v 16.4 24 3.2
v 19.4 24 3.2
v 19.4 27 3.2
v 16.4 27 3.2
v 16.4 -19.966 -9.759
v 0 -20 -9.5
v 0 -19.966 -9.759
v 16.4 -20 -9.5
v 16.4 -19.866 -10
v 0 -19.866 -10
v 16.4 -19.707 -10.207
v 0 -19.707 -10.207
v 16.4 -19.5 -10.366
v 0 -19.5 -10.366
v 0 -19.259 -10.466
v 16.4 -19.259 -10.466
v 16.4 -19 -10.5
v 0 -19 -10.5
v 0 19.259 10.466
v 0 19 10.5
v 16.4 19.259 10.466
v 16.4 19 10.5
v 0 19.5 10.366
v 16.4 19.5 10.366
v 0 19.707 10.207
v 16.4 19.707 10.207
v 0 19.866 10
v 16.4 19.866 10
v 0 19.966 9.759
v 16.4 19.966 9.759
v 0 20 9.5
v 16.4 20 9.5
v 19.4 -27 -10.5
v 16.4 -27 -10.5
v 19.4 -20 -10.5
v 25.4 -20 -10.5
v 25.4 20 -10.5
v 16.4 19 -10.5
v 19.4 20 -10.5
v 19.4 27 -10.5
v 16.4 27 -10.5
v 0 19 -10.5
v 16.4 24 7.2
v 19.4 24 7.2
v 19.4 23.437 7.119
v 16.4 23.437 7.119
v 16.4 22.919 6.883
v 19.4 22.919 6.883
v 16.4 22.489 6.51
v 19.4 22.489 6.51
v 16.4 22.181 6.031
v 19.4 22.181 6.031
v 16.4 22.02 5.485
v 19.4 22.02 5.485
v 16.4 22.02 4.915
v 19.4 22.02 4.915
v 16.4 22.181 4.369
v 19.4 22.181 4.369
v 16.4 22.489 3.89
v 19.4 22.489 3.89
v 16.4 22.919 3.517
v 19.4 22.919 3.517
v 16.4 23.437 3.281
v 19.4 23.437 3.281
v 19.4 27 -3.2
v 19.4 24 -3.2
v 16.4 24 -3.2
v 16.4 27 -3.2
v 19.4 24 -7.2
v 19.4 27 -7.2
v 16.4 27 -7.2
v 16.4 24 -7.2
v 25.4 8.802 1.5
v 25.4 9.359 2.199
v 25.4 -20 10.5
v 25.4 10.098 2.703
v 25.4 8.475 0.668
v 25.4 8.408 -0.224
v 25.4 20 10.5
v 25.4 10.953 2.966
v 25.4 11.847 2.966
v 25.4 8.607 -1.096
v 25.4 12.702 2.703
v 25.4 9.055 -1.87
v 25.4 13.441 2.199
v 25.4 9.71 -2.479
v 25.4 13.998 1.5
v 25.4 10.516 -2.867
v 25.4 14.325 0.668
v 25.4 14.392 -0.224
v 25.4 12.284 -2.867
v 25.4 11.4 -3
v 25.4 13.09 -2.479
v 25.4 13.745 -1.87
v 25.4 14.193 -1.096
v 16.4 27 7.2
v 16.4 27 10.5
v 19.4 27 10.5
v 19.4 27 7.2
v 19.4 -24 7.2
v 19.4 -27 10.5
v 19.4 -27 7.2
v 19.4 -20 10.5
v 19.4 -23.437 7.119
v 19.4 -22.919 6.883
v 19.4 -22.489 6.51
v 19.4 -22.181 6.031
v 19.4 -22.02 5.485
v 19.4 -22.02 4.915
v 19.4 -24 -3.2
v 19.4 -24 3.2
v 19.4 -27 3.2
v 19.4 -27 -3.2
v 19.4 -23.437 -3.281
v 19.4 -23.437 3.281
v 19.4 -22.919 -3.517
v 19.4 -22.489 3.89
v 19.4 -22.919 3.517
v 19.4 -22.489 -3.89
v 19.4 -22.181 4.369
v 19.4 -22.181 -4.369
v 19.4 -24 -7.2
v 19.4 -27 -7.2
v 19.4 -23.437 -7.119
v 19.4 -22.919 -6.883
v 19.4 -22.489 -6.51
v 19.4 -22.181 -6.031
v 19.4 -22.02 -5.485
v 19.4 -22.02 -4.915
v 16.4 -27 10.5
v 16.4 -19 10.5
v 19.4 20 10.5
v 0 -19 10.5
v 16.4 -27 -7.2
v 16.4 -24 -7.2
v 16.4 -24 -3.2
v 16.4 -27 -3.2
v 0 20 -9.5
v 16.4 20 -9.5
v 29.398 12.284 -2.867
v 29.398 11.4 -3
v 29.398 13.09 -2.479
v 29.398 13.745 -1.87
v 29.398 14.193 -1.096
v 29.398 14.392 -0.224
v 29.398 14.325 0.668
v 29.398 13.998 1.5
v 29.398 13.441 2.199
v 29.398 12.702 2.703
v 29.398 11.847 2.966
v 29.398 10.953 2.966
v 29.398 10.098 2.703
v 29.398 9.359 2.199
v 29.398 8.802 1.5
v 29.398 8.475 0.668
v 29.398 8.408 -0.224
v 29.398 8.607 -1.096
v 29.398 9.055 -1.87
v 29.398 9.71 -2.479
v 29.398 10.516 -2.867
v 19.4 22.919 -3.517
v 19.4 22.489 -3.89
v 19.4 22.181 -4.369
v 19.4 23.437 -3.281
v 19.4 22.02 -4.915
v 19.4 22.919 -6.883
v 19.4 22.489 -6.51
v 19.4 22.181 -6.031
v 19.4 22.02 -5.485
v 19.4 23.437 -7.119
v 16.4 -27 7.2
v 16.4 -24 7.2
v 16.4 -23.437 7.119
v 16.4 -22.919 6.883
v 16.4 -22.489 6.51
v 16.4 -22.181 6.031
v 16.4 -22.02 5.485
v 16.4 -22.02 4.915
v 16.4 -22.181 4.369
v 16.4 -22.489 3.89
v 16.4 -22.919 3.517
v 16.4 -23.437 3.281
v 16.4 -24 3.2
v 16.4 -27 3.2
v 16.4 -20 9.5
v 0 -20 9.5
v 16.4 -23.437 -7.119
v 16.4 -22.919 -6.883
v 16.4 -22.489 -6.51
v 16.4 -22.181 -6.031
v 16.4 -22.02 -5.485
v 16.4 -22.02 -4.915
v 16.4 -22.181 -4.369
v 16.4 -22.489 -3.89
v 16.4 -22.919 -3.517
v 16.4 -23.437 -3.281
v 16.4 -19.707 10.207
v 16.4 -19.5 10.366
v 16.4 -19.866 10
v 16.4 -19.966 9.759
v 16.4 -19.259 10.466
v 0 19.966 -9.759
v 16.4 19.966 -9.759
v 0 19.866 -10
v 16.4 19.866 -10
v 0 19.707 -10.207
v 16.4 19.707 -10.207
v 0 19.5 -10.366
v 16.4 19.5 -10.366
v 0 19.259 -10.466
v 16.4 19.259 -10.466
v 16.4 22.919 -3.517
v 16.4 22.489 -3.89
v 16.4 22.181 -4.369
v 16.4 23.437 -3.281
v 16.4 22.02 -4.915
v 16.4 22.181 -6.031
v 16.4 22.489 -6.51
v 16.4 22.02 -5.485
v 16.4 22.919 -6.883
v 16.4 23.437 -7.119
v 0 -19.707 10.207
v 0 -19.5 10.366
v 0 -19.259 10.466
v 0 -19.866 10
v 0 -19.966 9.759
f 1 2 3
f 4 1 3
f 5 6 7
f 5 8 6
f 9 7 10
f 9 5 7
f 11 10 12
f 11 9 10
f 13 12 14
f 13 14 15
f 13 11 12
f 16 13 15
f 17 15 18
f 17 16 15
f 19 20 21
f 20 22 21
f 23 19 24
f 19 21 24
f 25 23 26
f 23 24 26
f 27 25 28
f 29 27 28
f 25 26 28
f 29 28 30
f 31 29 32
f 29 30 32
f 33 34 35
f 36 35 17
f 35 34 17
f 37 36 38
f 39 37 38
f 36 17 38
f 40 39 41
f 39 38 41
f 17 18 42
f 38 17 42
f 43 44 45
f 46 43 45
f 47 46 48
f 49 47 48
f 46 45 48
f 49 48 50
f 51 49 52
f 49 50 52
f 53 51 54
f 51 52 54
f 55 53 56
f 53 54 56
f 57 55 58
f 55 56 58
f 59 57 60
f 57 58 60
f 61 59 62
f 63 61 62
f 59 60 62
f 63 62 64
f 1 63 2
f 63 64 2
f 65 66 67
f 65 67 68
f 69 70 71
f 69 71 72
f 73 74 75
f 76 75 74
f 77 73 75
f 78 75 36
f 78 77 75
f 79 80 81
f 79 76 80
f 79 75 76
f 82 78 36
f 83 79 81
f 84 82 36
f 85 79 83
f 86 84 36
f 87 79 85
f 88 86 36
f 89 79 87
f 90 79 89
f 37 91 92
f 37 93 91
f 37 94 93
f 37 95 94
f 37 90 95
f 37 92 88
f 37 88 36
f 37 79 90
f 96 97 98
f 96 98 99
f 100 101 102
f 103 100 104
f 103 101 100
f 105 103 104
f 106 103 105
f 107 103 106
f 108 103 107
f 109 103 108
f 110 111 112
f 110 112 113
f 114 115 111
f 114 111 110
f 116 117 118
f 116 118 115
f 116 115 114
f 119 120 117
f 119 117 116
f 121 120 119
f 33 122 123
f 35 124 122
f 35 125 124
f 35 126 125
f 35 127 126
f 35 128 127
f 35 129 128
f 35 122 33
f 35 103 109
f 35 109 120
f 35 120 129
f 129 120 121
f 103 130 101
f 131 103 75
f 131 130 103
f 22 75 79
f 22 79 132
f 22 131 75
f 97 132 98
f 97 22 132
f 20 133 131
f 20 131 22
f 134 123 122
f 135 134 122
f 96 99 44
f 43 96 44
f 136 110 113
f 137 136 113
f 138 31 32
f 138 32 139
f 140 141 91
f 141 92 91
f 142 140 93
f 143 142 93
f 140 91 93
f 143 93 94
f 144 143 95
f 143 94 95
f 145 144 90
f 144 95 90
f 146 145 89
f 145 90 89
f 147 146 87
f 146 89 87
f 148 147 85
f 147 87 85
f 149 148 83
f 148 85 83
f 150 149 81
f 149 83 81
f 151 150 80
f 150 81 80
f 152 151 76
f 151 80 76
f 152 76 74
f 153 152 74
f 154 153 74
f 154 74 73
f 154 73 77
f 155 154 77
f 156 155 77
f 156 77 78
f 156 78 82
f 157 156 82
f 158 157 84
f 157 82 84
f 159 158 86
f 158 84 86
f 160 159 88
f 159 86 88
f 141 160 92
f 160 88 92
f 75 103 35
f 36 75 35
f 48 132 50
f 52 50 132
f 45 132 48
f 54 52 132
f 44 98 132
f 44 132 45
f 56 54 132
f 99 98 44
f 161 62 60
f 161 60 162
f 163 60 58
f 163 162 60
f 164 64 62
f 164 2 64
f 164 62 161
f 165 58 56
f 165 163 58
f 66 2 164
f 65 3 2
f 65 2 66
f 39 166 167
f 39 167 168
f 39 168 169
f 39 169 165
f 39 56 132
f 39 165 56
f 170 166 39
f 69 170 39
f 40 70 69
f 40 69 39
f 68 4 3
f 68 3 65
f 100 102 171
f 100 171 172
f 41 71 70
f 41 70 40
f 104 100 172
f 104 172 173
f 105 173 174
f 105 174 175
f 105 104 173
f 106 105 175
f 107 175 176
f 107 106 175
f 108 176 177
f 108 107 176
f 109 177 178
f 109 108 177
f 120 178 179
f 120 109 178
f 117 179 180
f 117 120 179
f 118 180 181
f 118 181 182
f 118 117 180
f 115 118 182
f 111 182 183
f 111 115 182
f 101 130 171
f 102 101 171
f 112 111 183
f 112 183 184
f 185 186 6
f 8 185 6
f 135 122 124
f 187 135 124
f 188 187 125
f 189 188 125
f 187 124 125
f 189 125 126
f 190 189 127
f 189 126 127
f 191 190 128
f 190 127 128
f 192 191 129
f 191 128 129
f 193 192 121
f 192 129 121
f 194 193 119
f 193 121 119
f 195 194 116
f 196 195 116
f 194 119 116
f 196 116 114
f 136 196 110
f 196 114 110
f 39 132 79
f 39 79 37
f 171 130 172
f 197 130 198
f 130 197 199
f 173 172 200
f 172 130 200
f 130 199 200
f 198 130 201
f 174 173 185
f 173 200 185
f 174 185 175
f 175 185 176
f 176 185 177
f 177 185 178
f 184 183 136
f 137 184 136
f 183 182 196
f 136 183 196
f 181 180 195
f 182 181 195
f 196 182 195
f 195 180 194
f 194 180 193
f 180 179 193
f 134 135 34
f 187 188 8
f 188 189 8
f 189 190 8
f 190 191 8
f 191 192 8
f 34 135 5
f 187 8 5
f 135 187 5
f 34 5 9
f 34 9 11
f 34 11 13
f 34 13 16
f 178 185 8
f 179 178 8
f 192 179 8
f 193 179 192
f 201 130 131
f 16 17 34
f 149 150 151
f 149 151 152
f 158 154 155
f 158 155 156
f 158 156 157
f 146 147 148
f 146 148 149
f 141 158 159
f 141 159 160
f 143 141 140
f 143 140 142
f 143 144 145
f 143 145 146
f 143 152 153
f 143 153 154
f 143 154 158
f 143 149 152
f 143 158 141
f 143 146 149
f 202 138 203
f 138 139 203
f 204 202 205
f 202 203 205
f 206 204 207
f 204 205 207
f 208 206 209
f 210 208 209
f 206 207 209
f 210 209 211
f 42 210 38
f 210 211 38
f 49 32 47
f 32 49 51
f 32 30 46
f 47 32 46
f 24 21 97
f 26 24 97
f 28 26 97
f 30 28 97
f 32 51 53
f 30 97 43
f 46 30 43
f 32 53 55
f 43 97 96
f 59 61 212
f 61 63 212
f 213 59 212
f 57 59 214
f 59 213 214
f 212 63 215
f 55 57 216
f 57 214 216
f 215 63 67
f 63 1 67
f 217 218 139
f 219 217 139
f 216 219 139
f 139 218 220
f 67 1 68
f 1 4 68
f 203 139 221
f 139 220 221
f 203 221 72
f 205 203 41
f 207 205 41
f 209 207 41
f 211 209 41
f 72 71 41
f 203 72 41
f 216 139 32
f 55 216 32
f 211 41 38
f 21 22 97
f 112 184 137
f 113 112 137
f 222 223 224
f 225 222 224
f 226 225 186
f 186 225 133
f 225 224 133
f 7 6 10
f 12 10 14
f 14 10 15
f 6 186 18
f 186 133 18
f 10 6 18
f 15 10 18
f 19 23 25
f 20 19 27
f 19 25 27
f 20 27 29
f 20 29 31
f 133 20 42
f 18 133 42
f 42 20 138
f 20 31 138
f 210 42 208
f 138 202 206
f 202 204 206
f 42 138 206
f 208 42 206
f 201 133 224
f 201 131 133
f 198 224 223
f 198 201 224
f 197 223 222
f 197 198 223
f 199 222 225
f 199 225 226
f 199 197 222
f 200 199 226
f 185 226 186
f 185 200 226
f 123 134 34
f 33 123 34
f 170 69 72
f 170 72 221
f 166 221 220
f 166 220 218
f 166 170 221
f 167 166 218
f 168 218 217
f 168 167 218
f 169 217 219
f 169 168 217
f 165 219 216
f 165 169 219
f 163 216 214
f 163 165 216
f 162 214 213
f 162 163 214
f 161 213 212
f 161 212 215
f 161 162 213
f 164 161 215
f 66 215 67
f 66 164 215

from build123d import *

# Parameters (mm, degrees)
SKETCH1_W            = 21
SKETCH1_H            = 40
BOSS_EXTRUDE1_DEPTH  = 16.4
SKETCH2_W            = 21
SKETCH2_H            = 54
BOSS_EXTRUDE2_DEPTH  = 3
CUT_EXTRUDE1_DEPTH   = 3
MIRROR2_COPY_1_DEPTH = 3
SKETCH5_W            = 21
SKETCH5_H            = 40
BOSS_EXTRUDE4_DEPTH  = 6
SKETCH6_R            = 3
BOSS_EXTRUDE5_DEPTH  = 0.01
FILLET1_R            = 1
SKETCH9_R            = 3
BOSS_EXTRUDE7_DEPTH  = 3.9878


with BuildPart() as part:
    # Sketch1 → Boss-Extrude1 (new body)
    with BuildSketch(Plane(origin=(0, 0, 0), x_dir=(0, 0, -1), z_dir=(1, 0, 0))):
        Rectangle(SKETCH1_W, SKETCH1_H)
    extrude(amount=BOSS_EXTRUDE1_DEPTH)

    # Sketch2 → Boss-Extrude2 (add)
    with BuildSketch(Plane(origin=(16.4, 0, 0), x_dir=(0, 0, -1), z_dir=(1, 0, 0))):
        Rectangle(SKETCH2_W, SKETCH2_H)
    extrude(amount=BOSS_EXTRUDE2_DEPTH)

    # Sketch3 → Cut-Extrude1 (cut)
    with BuildSketch(Plane(origin=(19.4, 0, 0), x_dir=(0, 0, -1), z_dir=(1, 0, 0))):
        with BuildLine():
            Line((-3.200000014, 24), (-3.200000014, 27))
            Line((-3.200000014, 27), (-7.200000014, 27))
            Line((-7.200000014, 27), (-7.200000014, 24))
            ThreePointArc((-7.200000014, 24), (-5.200000014, 22), (-3.200000014, 24))
        make_face()
    cut_extrude1 = extrude(amount=-CUT_EXTRUDE1_DEPTH, mode=Mode.SUBTRACT)

    # Mirror1: Cut-Extrude1 across plane
    add(cut_extrude1.mirror(Plane.XY), mode=Mode.SUBTRACT)

    # Mirror2: Cut-Extrude1 across plane
    add(cut_extrude1.mirror(Plane.ZX), mode=Mode.SUBTRACT)

    # Mirror2 copy 1 sketch → Mirror2 copy 1 (cut)
    with BuildSketch(Plane(origin=(19.4, 0, 0), x_dir=(0, 0, 1), z_dir=(1, 0, 0))):
        with BuildLine():
            Line((-3.200000014, 24), (-3.200000014, 27))
            Line((-3.200000014, 27), (-7.200000014, 27))
            Line((-7.200000014, 27), (-7.200000014, 24))
            ThreePointArc((-7.200000014, 24), (-5.200000014, 22), (-3.200000014, 24))
        make_face()
    extrude(amount=-MIRROR2_COPY_1_DEPTH, mode=Mode.SUBTRACT)

    # Sketch5 → Boss-Extrude4 (add)
    with BuildSketch(Plane(origin=(19.4, 0, 0), x_dir=(0, 0, -1), z_dir=(1, 0, 0))):
        Rectangle(SKETCH5_W, SKETCH5_H)
    extrude(amount=BOSS_EXTRUDE4_DEPTH)

    # Sketch6 → Boss-Extrude5 (add)
    with BuildSketch(Plane(origin=(25.4, 0, 0), x_dir=(0, 0, -1), z_dir=(1, 0, 0))):
        with Locations((0, 11.4)):
            Circle(SKETCH6_R)
    extrude(amount=BOSS_EXTRUDE5_DEPTH)

    # Fillet1
    fillet1_edges = [part.edges().sort_by_distance(p)[0] for p in [
        (8.2, -20, -10.5),
        (8.2, -20, 10.5),
        (8.2, 20, 10.5),
        (8.2, 20, -10.5),
    ]]
    fillet(fillet1_edges, radius=FILLET1_R)

    # Sketch9 → Boss-Extrude7 (add)
    with BuildSketch(Plane(origin=(25.41, 0, 0), x_dir=(0, 0, -1), z_dir=(1, 0, 0))):
        with Locations((0, 11.4)):
            Circle(SKETCH9_R)
    extrude(amount=BOSS_EXTRUDE7_DEPTH)


solid = part.part
